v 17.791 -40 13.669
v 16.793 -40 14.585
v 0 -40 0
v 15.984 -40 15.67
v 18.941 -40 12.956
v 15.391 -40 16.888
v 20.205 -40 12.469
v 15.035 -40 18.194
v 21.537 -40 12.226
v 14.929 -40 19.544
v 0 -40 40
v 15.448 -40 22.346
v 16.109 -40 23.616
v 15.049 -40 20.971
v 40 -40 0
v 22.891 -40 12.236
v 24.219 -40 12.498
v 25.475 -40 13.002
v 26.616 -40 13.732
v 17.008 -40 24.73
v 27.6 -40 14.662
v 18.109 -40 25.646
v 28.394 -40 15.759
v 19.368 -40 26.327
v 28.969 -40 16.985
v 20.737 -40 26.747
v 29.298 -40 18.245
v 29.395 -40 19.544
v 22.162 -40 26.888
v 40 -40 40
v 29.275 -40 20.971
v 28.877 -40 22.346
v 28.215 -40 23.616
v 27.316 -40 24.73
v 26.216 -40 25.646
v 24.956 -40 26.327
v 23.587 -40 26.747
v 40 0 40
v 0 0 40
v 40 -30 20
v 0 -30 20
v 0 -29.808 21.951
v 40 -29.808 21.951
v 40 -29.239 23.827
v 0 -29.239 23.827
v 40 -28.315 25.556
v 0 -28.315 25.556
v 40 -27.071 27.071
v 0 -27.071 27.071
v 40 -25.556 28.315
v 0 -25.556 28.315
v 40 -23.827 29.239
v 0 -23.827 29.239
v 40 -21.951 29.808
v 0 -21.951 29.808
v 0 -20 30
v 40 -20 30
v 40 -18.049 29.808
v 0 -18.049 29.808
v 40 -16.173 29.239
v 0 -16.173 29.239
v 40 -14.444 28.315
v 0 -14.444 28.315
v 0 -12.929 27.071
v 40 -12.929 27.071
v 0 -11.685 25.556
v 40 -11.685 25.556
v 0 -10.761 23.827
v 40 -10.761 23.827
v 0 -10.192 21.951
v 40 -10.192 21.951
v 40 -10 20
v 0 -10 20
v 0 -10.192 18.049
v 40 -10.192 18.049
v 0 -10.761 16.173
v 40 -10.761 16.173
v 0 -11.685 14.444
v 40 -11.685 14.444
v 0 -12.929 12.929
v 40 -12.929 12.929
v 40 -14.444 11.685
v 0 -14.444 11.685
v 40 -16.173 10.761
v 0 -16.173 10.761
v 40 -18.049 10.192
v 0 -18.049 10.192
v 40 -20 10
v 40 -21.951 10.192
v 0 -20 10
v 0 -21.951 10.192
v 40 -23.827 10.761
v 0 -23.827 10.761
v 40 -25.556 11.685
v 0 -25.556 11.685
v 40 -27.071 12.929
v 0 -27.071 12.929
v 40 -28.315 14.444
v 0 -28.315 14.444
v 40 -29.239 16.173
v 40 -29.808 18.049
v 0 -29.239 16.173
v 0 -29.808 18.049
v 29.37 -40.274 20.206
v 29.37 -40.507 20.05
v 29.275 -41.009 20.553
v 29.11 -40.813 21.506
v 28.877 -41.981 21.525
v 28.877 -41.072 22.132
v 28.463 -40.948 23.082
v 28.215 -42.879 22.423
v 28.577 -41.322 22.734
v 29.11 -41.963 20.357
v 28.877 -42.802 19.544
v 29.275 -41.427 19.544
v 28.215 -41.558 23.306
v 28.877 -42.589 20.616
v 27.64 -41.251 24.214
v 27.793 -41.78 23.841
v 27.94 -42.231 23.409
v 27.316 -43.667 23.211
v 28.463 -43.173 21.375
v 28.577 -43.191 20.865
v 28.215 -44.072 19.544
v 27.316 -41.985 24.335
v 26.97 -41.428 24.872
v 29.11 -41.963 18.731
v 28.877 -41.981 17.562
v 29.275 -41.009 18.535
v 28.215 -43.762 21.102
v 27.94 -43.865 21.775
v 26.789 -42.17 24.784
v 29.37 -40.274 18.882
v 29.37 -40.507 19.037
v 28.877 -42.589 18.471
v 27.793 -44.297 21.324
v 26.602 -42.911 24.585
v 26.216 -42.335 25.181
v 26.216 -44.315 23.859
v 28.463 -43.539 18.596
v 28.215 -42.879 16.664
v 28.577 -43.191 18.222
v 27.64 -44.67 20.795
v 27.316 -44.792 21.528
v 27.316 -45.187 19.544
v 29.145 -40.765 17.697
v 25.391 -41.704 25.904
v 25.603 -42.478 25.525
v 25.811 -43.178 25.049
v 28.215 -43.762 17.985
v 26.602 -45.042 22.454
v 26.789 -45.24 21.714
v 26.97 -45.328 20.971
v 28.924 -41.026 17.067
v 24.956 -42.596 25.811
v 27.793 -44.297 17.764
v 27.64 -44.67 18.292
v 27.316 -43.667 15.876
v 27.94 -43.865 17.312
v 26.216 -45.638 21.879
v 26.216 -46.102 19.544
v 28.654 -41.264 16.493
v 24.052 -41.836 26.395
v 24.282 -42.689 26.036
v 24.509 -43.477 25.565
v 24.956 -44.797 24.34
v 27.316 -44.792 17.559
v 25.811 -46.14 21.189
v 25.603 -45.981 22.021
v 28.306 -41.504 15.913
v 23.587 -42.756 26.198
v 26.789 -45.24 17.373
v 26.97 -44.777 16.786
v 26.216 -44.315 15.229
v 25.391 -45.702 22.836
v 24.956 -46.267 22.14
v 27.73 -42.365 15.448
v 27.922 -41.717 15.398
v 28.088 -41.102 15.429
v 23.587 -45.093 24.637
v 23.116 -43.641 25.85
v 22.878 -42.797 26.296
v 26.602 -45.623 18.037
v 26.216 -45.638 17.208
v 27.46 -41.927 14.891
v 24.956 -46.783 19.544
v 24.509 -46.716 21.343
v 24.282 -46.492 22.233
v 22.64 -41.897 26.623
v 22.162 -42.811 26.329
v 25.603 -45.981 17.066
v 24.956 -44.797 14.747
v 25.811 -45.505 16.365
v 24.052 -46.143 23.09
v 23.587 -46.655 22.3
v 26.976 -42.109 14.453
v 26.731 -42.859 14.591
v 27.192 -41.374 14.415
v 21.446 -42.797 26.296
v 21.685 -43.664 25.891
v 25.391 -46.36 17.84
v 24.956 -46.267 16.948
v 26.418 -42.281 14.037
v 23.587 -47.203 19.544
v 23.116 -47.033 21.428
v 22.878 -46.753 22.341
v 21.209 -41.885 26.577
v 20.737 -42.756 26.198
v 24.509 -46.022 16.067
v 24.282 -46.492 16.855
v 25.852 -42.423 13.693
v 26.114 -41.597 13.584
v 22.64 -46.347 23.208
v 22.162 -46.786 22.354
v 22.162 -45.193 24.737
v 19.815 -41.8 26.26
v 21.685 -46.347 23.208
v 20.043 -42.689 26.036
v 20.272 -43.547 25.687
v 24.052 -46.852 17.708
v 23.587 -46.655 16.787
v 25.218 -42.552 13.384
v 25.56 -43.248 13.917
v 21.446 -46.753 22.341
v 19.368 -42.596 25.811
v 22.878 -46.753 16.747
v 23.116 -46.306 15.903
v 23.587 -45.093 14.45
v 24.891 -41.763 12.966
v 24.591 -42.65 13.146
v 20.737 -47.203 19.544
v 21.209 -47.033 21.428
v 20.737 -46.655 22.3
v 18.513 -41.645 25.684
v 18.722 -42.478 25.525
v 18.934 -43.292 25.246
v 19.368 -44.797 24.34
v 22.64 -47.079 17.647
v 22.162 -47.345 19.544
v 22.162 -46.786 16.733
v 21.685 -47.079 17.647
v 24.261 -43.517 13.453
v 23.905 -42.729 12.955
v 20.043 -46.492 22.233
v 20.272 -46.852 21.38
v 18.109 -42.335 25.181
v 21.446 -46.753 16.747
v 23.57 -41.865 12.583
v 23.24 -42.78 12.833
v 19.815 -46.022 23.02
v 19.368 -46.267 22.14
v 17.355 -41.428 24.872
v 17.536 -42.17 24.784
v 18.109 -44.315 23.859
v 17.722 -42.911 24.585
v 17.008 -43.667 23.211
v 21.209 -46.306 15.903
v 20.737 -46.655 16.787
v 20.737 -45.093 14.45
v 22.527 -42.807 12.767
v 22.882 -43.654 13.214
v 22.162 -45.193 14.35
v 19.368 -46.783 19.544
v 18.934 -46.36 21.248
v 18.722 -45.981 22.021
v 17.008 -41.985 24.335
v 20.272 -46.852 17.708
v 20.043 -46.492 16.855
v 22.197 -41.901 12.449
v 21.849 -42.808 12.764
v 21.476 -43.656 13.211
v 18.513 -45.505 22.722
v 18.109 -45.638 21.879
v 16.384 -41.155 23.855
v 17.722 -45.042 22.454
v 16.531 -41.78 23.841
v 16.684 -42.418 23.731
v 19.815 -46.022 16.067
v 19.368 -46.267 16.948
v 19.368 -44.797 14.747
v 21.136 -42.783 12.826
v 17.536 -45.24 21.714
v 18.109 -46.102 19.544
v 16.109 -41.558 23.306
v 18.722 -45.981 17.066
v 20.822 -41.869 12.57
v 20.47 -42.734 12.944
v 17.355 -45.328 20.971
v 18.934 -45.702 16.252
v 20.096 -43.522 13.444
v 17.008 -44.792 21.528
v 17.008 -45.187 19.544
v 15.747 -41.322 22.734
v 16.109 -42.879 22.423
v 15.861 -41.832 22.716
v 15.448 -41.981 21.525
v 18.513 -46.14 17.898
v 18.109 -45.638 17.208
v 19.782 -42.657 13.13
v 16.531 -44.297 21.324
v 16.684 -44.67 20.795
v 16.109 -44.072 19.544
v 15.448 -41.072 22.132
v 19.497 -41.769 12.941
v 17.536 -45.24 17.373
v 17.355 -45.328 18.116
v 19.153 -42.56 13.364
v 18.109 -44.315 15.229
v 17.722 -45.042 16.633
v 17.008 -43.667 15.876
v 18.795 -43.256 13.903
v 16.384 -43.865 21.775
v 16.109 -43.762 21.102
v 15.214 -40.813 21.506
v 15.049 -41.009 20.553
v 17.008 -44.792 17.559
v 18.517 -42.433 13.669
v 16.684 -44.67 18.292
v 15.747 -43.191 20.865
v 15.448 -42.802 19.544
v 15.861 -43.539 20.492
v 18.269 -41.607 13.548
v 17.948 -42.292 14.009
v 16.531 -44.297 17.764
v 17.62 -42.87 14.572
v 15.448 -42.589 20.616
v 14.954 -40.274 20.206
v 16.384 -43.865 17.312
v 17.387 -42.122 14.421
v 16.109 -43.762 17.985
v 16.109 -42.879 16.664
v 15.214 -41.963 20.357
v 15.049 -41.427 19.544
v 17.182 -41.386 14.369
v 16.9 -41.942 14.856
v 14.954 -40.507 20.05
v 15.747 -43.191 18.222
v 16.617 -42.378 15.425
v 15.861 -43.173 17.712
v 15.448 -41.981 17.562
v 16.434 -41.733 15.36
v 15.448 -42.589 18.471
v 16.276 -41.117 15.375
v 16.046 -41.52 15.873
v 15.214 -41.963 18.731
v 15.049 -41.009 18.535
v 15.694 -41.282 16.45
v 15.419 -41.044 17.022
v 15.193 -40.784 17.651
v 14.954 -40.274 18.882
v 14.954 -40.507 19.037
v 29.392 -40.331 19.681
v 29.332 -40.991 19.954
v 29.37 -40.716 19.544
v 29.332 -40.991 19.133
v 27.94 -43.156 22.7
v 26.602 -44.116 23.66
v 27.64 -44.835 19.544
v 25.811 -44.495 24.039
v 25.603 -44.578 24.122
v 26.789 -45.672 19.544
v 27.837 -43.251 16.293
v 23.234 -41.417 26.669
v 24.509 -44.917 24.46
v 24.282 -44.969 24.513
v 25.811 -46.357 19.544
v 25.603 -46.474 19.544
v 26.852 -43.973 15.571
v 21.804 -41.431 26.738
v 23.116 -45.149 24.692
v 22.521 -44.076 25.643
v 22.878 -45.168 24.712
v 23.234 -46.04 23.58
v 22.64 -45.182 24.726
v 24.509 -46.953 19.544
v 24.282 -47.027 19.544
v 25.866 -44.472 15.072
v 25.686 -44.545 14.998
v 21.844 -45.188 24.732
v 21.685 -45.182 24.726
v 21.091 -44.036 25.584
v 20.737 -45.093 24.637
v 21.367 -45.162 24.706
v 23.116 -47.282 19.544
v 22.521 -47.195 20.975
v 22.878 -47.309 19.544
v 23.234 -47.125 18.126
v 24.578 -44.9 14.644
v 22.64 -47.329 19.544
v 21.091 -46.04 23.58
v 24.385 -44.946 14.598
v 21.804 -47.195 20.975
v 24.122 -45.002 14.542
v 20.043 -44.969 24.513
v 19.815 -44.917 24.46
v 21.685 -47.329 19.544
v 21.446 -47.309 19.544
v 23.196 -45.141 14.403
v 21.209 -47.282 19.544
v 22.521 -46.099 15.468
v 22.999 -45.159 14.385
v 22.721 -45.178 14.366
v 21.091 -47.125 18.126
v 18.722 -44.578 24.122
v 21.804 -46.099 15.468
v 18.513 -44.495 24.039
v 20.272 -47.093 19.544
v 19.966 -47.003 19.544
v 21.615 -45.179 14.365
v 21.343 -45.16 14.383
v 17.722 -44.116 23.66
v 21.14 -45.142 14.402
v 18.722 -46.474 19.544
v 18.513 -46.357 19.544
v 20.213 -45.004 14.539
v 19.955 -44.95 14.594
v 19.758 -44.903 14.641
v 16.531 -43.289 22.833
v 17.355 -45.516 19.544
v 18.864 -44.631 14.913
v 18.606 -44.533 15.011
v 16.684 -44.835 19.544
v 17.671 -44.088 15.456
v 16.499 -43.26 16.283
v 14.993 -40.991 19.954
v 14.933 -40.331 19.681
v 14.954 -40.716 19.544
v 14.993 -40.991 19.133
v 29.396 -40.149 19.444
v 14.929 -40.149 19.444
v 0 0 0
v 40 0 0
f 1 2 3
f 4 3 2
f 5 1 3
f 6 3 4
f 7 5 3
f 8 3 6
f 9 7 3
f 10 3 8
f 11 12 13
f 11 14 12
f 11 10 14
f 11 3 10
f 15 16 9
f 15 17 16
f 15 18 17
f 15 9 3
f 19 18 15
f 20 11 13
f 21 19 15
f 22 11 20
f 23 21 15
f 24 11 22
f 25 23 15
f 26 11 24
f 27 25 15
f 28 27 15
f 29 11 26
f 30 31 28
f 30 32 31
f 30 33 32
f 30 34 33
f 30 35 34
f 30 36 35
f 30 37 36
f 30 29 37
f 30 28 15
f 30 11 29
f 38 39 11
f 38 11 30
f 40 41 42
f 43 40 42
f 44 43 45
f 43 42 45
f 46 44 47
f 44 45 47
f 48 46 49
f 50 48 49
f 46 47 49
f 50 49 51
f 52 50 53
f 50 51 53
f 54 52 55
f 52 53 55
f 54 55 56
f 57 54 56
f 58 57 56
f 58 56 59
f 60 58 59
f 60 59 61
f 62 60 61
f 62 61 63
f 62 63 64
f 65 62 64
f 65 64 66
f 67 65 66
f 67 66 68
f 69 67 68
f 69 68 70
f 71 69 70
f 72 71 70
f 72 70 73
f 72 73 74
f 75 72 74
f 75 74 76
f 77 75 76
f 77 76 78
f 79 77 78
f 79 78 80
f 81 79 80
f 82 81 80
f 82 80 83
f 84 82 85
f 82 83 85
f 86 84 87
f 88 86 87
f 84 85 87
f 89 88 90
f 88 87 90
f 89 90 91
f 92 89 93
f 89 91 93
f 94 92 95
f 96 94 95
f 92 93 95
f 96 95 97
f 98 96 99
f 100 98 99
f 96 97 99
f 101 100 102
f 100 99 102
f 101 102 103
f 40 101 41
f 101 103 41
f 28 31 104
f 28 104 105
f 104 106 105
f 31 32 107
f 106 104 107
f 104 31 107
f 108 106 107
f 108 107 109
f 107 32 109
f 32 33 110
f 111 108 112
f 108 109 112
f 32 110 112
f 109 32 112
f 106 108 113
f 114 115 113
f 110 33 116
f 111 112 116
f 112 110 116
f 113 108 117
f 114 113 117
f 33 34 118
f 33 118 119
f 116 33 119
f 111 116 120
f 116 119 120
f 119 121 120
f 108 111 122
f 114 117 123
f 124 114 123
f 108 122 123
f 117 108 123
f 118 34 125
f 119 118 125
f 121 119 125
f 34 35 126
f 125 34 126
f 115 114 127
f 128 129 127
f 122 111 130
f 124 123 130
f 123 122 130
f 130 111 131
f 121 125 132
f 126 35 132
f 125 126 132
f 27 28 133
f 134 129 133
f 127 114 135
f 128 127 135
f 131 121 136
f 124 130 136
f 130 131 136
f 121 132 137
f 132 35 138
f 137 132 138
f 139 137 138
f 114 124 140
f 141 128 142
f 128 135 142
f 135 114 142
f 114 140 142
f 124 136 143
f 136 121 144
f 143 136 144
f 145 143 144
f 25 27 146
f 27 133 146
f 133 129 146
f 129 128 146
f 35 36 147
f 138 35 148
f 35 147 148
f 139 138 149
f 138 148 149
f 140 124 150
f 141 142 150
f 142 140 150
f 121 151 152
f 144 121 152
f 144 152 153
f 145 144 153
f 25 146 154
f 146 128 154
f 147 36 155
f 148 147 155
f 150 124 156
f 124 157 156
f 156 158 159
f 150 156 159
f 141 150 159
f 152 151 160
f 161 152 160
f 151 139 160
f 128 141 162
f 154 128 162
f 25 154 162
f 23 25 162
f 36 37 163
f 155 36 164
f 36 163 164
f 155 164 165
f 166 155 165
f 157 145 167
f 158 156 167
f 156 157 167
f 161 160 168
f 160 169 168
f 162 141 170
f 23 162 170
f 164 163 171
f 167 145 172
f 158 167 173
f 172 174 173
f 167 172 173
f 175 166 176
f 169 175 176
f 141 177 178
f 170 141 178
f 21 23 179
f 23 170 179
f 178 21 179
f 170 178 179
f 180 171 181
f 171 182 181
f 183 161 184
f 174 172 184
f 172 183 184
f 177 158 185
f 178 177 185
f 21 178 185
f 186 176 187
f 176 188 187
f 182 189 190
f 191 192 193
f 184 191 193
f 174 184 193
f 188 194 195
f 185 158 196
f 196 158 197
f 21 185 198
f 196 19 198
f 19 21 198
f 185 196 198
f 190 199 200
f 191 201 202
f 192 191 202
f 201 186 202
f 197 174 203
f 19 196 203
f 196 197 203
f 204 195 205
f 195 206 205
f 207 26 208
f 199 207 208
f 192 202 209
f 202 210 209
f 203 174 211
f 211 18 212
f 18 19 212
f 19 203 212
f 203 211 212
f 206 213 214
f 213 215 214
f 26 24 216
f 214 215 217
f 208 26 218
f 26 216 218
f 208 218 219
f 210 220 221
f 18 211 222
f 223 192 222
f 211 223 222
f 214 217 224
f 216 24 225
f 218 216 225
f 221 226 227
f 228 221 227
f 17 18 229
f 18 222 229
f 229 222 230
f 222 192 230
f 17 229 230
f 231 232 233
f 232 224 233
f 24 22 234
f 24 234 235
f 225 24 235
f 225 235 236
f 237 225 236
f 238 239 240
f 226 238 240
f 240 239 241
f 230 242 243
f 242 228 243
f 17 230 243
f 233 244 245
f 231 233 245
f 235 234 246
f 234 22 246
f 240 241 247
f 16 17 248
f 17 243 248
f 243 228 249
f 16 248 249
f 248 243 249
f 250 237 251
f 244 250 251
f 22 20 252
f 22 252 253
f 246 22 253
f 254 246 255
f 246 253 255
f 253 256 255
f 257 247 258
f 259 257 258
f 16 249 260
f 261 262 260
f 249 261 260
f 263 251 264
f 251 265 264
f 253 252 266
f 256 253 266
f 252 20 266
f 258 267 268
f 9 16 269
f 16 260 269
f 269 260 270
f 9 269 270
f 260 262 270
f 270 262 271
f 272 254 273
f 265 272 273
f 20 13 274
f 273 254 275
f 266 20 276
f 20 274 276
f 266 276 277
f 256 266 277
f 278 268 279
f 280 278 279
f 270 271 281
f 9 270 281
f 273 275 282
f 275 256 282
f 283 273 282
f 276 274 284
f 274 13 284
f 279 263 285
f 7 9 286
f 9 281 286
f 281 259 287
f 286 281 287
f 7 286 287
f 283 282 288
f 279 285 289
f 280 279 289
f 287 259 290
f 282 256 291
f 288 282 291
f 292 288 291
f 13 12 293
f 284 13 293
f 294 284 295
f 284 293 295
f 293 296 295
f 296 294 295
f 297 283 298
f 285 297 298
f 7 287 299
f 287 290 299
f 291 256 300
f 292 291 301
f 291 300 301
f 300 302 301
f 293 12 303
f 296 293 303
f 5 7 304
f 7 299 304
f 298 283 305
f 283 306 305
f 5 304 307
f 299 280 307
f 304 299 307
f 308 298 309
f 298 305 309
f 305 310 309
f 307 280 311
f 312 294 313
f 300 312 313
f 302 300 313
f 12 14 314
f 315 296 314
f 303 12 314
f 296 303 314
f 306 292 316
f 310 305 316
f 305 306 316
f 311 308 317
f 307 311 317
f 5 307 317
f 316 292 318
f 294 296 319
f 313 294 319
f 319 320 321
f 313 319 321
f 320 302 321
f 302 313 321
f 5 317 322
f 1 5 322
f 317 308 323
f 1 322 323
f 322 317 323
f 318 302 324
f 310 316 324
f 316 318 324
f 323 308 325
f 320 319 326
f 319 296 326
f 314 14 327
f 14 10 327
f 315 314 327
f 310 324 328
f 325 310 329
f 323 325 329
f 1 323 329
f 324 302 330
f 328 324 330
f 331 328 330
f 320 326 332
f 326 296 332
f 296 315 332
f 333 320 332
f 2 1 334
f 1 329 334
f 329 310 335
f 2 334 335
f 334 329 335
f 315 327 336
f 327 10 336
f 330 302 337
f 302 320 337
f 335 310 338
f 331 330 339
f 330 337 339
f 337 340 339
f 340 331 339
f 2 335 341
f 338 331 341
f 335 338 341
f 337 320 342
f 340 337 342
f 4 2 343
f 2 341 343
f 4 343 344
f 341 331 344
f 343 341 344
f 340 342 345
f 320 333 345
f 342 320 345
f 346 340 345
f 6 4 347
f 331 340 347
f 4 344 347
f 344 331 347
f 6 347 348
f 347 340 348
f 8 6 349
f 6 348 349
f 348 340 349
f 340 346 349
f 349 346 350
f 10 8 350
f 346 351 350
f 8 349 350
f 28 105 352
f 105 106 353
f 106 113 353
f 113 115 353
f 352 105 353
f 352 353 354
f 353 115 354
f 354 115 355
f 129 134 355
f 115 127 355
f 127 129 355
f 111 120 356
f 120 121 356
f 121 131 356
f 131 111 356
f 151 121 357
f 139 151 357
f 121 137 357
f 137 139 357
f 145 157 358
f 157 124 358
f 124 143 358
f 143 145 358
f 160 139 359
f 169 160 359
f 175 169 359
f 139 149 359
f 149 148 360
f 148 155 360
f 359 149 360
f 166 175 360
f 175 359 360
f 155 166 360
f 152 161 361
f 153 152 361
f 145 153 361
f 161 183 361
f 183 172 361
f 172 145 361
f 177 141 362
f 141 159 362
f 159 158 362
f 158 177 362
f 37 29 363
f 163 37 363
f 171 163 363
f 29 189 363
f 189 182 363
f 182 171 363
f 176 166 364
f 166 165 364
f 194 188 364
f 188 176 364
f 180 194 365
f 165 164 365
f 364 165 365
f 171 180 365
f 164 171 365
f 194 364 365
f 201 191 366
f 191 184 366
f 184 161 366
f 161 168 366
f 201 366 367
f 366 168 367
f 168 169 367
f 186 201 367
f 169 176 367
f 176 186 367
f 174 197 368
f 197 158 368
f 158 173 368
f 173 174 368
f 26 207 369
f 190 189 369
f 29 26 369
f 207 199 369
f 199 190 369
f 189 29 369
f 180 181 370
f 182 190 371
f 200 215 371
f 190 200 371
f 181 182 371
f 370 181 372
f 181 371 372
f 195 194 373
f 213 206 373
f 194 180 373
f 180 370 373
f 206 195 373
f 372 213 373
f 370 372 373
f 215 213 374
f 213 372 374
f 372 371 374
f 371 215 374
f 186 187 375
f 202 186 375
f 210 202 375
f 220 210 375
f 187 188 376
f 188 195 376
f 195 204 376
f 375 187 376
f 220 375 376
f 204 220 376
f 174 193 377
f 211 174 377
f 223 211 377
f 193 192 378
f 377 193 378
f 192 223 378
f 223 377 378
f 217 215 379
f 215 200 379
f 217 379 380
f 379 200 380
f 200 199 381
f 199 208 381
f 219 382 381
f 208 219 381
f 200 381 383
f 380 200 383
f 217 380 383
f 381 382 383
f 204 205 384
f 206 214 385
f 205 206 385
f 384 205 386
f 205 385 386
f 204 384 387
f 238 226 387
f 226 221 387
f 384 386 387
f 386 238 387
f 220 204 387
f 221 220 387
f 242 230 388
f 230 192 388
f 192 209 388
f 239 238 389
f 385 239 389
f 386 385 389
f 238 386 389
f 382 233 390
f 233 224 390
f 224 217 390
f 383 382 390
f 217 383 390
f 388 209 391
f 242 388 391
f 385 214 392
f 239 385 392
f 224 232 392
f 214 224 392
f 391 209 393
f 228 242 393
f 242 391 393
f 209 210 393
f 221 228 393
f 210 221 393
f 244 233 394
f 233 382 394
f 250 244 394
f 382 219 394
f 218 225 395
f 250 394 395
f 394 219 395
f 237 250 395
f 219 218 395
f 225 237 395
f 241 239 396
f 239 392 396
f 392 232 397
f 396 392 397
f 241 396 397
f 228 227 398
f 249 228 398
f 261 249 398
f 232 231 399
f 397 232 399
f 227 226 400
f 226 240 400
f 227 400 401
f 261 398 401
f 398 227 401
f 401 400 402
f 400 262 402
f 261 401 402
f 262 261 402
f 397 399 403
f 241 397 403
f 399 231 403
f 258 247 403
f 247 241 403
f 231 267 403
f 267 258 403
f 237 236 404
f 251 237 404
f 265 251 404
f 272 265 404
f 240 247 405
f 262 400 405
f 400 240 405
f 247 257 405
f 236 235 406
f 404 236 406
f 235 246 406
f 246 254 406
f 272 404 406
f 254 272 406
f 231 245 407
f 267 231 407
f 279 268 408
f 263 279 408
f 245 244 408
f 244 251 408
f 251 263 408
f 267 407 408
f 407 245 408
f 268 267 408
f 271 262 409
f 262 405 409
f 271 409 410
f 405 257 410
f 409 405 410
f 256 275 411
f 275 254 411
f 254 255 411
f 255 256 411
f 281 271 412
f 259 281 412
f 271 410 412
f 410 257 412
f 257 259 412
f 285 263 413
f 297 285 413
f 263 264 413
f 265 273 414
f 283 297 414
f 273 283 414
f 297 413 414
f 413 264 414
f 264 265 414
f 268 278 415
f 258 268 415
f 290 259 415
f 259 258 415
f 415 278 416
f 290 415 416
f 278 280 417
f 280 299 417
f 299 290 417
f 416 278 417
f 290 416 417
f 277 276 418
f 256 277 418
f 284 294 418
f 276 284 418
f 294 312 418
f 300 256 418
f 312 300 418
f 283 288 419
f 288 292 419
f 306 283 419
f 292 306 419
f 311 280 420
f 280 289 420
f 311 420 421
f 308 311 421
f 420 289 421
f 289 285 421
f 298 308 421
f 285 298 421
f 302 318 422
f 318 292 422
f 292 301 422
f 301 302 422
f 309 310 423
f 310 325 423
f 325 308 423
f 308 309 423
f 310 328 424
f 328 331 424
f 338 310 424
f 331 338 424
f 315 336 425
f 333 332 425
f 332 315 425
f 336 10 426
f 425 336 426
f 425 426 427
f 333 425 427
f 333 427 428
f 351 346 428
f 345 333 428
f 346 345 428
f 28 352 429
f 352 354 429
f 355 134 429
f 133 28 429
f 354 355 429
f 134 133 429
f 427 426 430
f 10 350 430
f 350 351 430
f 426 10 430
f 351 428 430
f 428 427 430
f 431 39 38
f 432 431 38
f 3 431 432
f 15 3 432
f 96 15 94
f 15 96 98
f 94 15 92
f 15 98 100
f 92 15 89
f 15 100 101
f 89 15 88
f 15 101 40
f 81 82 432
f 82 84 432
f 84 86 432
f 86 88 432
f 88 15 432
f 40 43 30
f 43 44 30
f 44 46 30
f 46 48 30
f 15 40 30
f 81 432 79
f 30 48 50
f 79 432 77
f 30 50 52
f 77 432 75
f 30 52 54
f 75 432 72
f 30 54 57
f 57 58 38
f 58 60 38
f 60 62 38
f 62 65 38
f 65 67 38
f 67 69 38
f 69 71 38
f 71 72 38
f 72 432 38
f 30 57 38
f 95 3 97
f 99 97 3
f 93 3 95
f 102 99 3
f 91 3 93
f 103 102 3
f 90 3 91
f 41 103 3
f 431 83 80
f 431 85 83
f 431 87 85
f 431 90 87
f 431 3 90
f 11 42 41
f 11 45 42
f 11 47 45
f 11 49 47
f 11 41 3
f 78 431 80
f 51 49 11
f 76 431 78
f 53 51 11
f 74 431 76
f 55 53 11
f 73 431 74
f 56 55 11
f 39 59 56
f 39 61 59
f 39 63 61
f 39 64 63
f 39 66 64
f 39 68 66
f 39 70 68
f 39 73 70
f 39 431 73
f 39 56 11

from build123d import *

# Parameters (mm, degrees)
F0_W     = 40
F0_H     = 40
F1_DEPTH = 40
F2_R     = 10
F3_DEPTH = 40.001


with BuildPart() as f1:
    # F0 (on Front) → F1 (new body)
    with BuildSketch(Plane.XZ):
        with Locations((20, 20)):
            Rectangle(F0_W, F0_H)
    extrude(amount=F1_DEPTH)

    # F2 (on face) → F3 (cut, through all)
    with BuildSketch(Plane(origin=(0, 0, 0), x_dir=(0, -1, 0), z_dir=(-1, 0, 0))):
        with Locations((20, 20)):
            Circle(F2_R)
    extrude(amount=-F3_DEPTH, mode=Mode.SUBTRACT)

    # F4 (on face) → F5 (revolve)
    with BuildSketch(Plane.XZ.offset(40)):
        with BuildLine():
            ThreePointArc((29.395014, 19.543692), (22.16222, 26.88829), (14.929425, 19.543692))
            Line((14.929425, 19.543692), (29.395014, 19.543692))
        make_face()
    revolve(axis=Axis((22.16222, -40, 19.543692), (1, 0, 0)))


solid = f1.part
